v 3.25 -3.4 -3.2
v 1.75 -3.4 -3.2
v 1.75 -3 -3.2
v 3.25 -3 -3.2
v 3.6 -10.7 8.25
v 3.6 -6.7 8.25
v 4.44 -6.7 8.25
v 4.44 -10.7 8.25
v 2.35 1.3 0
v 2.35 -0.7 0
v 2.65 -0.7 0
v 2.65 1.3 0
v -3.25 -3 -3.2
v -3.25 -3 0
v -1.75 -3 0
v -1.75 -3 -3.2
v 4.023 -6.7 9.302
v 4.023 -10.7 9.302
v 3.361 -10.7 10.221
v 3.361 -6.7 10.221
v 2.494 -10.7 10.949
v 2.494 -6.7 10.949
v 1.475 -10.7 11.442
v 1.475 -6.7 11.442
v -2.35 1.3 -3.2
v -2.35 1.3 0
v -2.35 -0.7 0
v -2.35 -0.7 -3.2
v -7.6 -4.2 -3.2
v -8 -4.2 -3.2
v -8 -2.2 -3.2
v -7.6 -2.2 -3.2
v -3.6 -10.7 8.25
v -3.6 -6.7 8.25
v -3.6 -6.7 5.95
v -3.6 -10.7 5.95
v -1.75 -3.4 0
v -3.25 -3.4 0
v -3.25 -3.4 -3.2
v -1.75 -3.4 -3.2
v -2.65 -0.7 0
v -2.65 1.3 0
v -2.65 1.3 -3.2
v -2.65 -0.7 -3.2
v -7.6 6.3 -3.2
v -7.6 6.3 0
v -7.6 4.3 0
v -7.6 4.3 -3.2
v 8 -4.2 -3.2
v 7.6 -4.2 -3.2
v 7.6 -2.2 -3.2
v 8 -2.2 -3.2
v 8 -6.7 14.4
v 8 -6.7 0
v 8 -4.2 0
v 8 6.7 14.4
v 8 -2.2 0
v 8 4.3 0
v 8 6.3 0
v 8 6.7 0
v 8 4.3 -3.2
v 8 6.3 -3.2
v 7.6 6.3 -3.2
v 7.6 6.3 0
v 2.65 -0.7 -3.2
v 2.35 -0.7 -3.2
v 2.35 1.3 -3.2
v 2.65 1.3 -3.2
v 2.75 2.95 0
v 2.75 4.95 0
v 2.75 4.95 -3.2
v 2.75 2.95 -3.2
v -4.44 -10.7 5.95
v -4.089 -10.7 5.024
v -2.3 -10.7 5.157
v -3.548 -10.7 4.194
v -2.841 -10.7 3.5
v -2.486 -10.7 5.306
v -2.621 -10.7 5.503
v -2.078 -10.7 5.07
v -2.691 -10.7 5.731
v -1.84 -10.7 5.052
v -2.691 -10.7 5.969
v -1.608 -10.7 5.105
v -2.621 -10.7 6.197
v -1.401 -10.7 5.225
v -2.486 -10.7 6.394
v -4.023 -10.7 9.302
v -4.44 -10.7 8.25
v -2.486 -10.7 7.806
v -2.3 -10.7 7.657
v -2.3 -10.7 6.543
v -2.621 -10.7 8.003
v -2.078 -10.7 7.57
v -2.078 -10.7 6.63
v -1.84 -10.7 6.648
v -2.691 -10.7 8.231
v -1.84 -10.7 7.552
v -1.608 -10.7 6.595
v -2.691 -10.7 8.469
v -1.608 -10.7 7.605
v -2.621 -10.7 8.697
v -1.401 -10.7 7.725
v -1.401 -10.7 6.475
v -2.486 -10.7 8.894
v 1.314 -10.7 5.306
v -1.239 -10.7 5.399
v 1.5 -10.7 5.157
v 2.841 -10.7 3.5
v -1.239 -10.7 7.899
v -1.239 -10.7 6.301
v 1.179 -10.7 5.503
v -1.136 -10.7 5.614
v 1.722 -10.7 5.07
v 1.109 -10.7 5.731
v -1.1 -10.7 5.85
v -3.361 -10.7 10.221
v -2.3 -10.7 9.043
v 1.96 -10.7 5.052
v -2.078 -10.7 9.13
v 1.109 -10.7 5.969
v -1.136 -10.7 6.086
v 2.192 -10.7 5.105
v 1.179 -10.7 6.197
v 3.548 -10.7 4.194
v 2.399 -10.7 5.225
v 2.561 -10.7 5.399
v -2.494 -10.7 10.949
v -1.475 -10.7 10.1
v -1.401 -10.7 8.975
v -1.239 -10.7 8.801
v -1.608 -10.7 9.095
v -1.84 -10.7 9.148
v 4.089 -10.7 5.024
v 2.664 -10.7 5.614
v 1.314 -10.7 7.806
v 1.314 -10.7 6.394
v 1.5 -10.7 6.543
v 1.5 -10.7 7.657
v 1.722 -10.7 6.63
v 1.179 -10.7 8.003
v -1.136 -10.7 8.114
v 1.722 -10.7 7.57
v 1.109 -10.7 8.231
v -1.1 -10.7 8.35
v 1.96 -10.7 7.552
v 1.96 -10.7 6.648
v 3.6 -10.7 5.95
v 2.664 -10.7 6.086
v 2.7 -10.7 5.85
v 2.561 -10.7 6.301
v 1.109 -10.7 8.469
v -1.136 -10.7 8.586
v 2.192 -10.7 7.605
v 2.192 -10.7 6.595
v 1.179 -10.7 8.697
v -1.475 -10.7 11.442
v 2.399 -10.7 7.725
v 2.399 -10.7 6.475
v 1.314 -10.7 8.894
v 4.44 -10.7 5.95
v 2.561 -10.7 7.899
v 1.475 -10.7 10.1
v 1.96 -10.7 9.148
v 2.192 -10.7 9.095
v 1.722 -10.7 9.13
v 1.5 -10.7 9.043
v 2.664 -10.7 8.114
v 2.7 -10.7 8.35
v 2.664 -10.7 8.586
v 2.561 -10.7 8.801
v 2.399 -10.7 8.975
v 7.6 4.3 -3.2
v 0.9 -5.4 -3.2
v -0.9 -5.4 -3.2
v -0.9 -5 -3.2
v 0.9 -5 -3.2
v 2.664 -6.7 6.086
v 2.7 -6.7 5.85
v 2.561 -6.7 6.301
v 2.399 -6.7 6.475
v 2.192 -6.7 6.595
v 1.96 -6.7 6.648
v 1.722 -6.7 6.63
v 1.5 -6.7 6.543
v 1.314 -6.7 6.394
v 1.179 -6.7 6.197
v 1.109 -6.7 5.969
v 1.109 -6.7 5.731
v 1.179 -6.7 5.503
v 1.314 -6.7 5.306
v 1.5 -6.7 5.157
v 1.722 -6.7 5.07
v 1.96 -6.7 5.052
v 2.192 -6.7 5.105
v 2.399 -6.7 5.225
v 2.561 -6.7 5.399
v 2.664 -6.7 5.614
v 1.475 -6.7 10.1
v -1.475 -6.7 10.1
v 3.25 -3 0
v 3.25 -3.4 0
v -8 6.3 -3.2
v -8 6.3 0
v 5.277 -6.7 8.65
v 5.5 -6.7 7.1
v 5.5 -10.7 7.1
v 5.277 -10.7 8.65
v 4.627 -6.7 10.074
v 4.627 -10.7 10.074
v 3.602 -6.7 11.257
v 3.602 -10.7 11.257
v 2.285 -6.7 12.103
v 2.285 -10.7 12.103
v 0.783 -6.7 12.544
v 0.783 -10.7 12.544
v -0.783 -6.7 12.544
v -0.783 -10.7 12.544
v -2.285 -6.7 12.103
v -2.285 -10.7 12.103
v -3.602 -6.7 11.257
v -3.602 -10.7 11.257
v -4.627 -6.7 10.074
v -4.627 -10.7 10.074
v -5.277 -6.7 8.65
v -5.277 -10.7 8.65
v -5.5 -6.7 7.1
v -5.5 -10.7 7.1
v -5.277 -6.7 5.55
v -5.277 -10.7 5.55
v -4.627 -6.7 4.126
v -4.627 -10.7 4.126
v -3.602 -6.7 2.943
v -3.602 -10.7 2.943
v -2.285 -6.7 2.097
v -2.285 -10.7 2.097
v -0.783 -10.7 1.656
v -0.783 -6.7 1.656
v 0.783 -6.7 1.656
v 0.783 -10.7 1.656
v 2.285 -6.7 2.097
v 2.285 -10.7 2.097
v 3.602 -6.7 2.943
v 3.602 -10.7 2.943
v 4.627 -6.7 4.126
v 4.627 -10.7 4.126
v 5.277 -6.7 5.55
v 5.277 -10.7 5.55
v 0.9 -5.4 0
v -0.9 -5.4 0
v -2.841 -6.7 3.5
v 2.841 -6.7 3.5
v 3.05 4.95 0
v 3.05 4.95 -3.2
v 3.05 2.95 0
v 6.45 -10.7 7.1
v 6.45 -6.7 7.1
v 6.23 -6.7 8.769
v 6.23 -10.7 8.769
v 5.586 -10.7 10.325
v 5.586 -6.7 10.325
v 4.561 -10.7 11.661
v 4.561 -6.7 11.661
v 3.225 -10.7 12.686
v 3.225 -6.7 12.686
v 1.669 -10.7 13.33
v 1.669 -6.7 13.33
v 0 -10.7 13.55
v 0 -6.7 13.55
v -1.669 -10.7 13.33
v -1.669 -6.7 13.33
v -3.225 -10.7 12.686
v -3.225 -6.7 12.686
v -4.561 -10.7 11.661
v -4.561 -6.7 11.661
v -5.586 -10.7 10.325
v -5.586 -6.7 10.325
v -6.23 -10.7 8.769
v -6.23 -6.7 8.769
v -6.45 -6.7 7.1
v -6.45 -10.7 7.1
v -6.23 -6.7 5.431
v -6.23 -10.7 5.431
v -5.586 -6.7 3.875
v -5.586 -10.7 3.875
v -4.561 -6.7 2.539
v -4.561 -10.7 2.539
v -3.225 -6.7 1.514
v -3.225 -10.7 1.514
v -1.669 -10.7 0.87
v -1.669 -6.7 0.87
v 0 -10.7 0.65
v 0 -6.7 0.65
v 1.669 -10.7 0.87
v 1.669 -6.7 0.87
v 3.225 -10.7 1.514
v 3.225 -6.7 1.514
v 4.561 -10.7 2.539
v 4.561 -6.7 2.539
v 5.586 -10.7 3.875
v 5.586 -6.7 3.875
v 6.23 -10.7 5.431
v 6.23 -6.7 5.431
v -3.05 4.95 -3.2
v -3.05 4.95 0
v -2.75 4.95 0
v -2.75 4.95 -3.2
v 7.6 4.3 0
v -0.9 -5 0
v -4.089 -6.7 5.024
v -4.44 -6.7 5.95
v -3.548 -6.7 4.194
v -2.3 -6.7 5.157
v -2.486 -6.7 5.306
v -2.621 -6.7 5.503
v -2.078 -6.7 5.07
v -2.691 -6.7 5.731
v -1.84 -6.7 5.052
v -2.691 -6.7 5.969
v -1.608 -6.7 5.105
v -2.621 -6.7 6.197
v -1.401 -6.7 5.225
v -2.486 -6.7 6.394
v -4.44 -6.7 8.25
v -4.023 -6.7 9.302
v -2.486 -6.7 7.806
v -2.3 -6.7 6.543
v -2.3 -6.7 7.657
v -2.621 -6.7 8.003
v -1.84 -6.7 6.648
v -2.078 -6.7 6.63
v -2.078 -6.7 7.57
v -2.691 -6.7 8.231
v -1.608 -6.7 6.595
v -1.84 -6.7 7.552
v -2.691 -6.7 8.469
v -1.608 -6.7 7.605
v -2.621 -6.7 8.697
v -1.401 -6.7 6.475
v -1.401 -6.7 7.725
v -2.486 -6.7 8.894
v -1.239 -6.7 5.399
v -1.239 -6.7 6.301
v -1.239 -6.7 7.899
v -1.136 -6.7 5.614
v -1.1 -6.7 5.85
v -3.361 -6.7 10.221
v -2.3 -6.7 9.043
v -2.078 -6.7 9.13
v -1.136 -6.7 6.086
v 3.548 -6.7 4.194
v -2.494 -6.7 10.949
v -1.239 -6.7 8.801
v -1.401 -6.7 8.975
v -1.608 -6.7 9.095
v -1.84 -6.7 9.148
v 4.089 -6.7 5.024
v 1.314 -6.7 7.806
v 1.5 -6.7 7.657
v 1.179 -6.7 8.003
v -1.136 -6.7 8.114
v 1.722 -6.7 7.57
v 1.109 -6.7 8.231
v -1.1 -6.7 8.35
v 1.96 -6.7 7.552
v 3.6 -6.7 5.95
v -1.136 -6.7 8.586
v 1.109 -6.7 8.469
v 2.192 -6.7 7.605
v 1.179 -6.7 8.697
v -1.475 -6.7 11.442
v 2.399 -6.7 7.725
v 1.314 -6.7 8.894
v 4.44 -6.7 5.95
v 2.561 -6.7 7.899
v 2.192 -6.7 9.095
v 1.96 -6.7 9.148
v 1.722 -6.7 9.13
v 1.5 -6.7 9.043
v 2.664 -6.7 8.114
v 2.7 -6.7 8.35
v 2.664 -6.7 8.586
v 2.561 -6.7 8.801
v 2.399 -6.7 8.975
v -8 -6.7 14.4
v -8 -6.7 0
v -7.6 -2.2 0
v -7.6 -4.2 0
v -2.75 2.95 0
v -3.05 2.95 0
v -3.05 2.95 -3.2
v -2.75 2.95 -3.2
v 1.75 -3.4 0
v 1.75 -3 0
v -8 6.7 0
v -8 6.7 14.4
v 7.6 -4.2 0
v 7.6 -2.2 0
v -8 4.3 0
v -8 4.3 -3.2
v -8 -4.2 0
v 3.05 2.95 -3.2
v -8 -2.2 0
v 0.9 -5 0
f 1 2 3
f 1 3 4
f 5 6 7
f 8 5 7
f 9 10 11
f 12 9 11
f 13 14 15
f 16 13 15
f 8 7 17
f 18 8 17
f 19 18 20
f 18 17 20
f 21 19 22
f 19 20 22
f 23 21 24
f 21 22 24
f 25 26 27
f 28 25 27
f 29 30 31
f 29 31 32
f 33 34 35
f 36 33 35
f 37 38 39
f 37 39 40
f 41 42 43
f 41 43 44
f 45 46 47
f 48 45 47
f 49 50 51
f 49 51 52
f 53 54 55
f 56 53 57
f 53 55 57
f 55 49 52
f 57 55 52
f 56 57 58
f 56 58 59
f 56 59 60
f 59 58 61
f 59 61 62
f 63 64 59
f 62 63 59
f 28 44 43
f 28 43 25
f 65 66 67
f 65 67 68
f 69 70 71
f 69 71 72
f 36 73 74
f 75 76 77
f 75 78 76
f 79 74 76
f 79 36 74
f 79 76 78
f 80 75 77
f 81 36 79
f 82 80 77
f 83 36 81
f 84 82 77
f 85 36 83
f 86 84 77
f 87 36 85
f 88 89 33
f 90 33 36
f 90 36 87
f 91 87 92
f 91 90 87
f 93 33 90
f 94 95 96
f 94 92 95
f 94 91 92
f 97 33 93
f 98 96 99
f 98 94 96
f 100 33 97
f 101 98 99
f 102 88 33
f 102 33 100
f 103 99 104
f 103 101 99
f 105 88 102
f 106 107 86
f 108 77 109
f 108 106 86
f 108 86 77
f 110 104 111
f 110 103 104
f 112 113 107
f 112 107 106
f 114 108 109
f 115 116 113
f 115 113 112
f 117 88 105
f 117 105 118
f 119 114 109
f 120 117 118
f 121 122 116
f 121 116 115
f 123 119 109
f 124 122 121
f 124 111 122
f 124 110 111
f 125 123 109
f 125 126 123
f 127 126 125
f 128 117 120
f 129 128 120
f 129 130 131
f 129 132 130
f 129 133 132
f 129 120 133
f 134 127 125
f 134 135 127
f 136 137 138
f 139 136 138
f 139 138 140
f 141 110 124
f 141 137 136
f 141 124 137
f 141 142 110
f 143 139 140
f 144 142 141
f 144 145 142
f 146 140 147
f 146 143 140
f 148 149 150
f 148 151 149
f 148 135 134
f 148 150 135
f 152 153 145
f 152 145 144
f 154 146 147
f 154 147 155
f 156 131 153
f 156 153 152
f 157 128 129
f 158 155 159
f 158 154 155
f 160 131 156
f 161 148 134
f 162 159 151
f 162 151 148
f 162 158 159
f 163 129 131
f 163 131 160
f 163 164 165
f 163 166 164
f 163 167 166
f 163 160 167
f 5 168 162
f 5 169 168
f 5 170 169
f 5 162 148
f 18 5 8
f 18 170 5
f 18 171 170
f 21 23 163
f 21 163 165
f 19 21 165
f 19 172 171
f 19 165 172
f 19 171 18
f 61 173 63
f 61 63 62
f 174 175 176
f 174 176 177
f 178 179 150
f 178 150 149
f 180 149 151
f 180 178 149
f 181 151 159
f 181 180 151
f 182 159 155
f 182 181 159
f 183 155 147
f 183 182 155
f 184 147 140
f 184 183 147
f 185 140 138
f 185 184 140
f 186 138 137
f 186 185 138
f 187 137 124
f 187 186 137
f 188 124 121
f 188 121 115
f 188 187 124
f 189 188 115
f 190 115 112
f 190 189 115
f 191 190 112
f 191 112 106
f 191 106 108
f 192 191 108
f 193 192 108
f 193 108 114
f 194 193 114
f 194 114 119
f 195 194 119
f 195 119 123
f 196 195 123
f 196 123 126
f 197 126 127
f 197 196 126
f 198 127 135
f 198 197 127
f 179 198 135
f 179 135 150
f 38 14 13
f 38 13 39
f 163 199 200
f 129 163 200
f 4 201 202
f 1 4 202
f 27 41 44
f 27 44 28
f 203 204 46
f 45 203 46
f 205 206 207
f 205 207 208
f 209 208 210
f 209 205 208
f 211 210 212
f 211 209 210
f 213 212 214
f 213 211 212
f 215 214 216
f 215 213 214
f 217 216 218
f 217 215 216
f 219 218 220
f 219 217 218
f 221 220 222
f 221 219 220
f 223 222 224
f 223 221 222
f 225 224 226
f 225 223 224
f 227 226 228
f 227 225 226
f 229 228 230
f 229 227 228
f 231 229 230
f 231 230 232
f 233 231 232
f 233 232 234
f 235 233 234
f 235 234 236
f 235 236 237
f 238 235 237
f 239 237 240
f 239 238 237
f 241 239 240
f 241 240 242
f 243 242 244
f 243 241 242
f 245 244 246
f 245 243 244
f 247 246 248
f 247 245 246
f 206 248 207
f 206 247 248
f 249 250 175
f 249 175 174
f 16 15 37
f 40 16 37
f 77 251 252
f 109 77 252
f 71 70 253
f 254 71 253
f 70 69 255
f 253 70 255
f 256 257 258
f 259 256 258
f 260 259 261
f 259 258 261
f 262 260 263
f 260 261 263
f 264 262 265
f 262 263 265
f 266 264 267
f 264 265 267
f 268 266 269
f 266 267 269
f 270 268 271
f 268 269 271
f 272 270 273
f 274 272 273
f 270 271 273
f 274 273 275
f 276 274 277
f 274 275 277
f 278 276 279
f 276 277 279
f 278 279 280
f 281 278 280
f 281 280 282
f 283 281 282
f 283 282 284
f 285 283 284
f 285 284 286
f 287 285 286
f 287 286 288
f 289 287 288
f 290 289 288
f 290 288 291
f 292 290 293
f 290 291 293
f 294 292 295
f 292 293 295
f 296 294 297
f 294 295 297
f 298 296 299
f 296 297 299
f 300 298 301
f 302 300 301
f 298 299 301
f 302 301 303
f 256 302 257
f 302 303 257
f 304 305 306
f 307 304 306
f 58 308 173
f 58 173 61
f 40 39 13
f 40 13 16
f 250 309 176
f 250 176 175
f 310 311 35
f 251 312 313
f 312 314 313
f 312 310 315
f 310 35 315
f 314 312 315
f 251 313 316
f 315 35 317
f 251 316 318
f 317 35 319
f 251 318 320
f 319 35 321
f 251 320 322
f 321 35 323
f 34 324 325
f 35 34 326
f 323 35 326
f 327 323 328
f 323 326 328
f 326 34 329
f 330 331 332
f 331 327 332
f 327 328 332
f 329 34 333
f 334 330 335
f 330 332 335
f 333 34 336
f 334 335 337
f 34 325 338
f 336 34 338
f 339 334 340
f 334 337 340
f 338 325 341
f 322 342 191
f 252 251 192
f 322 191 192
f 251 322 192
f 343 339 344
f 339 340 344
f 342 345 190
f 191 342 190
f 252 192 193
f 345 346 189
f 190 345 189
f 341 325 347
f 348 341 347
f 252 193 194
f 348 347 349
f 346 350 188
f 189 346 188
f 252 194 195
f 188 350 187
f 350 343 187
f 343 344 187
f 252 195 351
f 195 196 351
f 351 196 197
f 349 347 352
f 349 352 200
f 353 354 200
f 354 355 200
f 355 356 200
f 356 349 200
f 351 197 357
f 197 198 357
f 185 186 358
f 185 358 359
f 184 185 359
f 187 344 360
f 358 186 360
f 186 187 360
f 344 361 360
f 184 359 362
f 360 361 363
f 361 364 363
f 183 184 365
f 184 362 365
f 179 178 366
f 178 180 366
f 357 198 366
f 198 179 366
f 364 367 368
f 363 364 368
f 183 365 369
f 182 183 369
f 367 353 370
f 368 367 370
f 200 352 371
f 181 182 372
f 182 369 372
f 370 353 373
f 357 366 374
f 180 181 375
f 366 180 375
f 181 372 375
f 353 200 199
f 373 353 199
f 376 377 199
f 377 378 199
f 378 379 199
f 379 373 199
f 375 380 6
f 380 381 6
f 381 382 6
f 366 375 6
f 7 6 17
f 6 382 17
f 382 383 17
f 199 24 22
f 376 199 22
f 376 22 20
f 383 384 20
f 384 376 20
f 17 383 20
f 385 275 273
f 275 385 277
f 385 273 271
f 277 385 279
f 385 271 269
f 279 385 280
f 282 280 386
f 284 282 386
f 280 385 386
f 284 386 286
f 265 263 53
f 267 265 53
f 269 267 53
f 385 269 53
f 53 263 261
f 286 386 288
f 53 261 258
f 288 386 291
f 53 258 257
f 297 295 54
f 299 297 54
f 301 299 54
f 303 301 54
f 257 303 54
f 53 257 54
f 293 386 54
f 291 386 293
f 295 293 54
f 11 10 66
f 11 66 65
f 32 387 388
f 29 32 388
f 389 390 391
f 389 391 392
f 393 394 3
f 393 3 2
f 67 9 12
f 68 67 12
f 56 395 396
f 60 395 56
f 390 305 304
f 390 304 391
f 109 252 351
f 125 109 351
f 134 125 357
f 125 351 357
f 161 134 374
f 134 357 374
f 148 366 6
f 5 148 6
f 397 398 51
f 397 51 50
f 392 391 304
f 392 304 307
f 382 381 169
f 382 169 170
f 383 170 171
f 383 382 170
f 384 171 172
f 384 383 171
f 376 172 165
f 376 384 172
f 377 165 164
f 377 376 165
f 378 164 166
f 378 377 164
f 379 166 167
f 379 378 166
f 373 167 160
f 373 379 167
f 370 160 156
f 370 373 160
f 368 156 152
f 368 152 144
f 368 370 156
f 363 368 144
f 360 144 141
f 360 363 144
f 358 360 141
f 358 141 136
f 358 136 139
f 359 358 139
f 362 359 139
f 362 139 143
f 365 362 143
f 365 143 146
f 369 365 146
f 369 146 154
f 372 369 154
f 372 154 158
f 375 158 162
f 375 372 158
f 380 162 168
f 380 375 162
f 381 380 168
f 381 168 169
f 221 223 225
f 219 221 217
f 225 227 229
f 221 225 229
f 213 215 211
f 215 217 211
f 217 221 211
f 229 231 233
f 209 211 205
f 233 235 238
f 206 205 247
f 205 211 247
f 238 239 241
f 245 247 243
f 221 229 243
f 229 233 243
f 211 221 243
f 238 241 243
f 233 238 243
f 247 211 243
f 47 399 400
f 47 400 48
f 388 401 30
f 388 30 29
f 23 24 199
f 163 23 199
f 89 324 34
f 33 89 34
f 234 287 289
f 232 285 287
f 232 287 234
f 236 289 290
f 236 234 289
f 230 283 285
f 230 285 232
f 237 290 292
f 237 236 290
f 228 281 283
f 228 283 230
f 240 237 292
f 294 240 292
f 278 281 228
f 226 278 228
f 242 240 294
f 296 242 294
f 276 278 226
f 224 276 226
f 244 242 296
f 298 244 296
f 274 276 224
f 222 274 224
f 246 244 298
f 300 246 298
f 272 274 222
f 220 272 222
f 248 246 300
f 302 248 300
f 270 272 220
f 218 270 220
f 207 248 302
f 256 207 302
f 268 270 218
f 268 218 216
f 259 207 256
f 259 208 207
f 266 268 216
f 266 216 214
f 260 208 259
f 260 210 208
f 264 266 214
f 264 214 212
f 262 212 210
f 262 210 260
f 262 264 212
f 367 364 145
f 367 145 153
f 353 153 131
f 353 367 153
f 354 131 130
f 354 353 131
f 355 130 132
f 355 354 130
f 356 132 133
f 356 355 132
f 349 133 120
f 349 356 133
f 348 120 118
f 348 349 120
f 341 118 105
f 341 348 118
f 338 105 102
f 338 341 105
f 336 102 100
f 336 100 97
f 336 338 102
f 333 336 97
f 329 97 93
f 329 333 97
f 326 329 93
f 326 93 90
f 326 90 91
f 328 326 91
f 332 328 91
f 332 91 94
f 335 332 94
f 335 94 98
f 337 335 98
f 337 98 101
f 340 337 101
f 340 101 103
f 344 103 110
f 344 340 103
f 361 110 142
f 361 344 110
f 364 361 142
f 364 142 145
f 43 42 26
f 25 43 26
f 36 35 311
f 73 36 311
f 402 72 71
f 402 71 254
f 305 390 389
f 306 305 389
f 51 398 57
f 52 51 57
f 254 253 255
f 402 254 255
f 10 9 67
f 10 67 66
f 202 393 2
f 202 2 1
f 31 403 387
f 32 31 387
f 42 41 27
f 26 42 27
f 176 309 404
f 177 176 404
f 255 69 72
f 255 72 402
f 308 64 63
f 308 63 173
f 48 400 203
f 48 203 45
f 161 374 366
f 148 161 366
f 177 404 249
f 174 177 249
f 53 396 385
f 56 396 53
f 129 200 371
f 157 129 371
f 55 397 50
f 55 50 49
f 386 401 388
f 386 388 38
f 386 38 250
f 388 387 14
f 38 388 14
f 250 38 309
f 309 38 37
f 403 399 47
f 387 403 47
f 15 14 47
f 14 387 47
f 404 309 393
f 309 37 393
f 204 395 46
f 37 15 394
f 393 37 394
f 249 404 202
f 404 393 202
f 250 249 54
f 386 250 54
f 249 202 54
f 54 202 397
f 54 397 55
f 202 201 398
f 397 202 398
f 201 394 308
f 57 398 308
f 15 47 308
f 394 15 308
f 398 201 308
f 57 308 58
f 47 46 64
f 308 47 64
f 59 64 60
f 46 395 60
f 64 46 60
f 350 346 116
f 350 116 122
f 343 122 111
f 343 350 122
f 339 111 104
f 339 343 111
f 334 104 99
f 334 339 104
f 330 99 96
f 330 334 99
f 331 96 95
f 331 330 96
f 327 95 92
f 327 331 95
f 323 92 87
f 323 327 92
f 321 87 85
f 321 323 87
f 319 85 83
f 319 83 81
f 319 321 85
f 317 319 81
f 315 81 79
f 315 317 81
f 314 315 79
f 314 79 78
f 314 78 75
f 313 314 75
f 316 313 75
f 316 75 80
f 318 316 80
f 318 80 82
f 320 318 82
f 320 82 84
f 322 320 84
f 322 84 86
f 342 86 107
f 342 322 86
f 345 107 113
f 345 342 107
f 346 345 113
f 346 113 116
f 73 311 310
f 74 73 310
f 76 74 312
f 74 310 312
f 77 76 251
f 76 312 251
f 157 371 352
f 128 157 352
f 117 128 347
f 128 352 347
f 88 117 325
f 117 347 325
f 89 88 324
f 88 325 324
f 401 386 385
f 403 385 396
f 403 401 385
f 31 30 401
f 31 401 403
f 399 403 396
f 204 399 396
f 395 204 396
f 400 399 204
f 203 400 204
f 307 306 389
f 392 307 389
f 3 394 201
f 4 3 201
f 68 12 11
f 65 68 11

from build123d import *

# Parameters (mm, degrees)
F0_W     = 16
F0_H     = 13.4
F1_DEPTH = 14.4
F2_R     = 6.45
F2_R_2   = 5.5
F3_DEPTH = 4
F4_R     = 0.8
F5_DEPTH = 4
F6_W     = 1.8
F6_H     = 0.4
F6_W_2   = 0.4
F6_H_2   = 2
F6_W_3   = 1.5
F7_DEPTH = 3.2
F8_W     = 0.3
F8_H     = 2
F9_DEPTH = 3.2


with BuildPart() as f1:
    # F0 (on Top) → F1 (new body)
    with BuildSketch(Plane.XY):
        Rectangle(F0_W, F0_H)
    extrude(amount=F1_DEPTH)

    # F2 (on face) → F3 (join)
    with BuildSketch(Plane.XZ.offset(6.7)):
        with Locations((0, 7.1)):
            Circle(F2_R)
        with Locations((0, 7.1)):
            Circle(F2_R_2, mode=Mode.SUBTRACT)
    extrude(amount=F3_DEPTH)

    # F6 (on face) → F7 (join)
    with BuildSketch(Plane(origin=(0, 0, 0), x_dir=(1, 0, 0), z_dir=(0, 0, -1))):
        with Locations((0, 5.2)):
            Rectangle(F6_W, F6_H)
        with Locations((7.8, 3.2)):
            Rectangle(F6_W_2, F6_H_2)
        with Locations((7.8, -5.3)):
            Rectangle(F6_W_2, F6_H_2)
        with Locations((-7.8, 3.2)):
            Rectangle(F6_W_2, F6_H_2)
        with Locations((-7.8, -5.3)):
            Rectangle(F6_W_2, F6_H_2)
        with Locations((-2.5, 3.2)):
            Rectangle(F6_W_3, F6_H)
        with Locations((2.5, 3.2)):
            Rectangle(F6_W_3, F6_H)
    extrude(amount=F7_DEPTH)


with BuildPart() as f5:
    # F4 (on face) → F5 (new body)
    with BuildSketch(Plane.XZ.offset(6.7)):
        with BuildLine():
            Line((-3.6, 5.95), (-4.439502, 5.95))
            ThreePointArc((-4.439502, 5.95), (-3.840873, 4.594133), (-2.84107, 3.5))
            Line((-2.84107, 3.5), (2.84107, 3.5))
            ThreePointArc((2.84107, 3.5), (3.840873, 4.594133), (4.439502, 5.95))
            Line((4.439502, 5.95), (3.6, 5.95))
            Line((3.6, 5.95), (3.6, 8.25))
            Line((3.6, 8.25), (4.439502, 8.25))
            ThreePointArc((4.439502, 8.25), (3.360523, 10.220667), (1.475, 11.442356))
            Line((1.475, 11.442356), (1.475, 10.1))
            Line((1.475, 10.1), (-1.475, 10.1))
            Line((-1.475, 10.1), (-1.475, 11.442356))
            ThreePointArc((-1.475, 11.442356), (-3.360523, 10.220667), (-4.439502, 8.25))
            Line((-4.439502, 8.25), (-3.6, 8.25))
            Line((-3.6, 8.25), (-3.6, 5.95))
        make_face()
        with Locations((-1.9, 5.85)):
            Circle(F4_R, mode=Mode.SUBTRACT)
        with Locations((1.9, 5.85)):
            Circle(F4_R, mode=Mode.SUBTRACT)
        with Locations((-1.9, 8.35)):
            Circle(F4_R, mode=Mode.SUBTRACT)
        with Locations((1.9, 8.35)):
            Circle(F4_R, mode=Mode.SUBTRACT)
    extrude(amount=F5_DEPTH)


with BuildPart() as f9:
    # F8 (on face) → F9 (new body)
    with BuildSketch(Plane(origin=(0, 0, 0), x_dir=(1, 0, 0), z_dir=(0, 0, -1))):
        with Locations((-2.5, -0.3)):
            Rectangle(F8_W, F8_H)
        with Locations((2.5, -0.3)):
            Rectangle(F8_W, F8_H)
        with Locations((-2.9, -3.95)):
            Rectangle(F8_W, F8_H)
        with Locations((2.9, -3.95)):
            Rectangle(F8_W, F8_H)
    extrude(amount=F9_DEPTH)


solid = Compound([f1.part, f5.part, f9.part])
